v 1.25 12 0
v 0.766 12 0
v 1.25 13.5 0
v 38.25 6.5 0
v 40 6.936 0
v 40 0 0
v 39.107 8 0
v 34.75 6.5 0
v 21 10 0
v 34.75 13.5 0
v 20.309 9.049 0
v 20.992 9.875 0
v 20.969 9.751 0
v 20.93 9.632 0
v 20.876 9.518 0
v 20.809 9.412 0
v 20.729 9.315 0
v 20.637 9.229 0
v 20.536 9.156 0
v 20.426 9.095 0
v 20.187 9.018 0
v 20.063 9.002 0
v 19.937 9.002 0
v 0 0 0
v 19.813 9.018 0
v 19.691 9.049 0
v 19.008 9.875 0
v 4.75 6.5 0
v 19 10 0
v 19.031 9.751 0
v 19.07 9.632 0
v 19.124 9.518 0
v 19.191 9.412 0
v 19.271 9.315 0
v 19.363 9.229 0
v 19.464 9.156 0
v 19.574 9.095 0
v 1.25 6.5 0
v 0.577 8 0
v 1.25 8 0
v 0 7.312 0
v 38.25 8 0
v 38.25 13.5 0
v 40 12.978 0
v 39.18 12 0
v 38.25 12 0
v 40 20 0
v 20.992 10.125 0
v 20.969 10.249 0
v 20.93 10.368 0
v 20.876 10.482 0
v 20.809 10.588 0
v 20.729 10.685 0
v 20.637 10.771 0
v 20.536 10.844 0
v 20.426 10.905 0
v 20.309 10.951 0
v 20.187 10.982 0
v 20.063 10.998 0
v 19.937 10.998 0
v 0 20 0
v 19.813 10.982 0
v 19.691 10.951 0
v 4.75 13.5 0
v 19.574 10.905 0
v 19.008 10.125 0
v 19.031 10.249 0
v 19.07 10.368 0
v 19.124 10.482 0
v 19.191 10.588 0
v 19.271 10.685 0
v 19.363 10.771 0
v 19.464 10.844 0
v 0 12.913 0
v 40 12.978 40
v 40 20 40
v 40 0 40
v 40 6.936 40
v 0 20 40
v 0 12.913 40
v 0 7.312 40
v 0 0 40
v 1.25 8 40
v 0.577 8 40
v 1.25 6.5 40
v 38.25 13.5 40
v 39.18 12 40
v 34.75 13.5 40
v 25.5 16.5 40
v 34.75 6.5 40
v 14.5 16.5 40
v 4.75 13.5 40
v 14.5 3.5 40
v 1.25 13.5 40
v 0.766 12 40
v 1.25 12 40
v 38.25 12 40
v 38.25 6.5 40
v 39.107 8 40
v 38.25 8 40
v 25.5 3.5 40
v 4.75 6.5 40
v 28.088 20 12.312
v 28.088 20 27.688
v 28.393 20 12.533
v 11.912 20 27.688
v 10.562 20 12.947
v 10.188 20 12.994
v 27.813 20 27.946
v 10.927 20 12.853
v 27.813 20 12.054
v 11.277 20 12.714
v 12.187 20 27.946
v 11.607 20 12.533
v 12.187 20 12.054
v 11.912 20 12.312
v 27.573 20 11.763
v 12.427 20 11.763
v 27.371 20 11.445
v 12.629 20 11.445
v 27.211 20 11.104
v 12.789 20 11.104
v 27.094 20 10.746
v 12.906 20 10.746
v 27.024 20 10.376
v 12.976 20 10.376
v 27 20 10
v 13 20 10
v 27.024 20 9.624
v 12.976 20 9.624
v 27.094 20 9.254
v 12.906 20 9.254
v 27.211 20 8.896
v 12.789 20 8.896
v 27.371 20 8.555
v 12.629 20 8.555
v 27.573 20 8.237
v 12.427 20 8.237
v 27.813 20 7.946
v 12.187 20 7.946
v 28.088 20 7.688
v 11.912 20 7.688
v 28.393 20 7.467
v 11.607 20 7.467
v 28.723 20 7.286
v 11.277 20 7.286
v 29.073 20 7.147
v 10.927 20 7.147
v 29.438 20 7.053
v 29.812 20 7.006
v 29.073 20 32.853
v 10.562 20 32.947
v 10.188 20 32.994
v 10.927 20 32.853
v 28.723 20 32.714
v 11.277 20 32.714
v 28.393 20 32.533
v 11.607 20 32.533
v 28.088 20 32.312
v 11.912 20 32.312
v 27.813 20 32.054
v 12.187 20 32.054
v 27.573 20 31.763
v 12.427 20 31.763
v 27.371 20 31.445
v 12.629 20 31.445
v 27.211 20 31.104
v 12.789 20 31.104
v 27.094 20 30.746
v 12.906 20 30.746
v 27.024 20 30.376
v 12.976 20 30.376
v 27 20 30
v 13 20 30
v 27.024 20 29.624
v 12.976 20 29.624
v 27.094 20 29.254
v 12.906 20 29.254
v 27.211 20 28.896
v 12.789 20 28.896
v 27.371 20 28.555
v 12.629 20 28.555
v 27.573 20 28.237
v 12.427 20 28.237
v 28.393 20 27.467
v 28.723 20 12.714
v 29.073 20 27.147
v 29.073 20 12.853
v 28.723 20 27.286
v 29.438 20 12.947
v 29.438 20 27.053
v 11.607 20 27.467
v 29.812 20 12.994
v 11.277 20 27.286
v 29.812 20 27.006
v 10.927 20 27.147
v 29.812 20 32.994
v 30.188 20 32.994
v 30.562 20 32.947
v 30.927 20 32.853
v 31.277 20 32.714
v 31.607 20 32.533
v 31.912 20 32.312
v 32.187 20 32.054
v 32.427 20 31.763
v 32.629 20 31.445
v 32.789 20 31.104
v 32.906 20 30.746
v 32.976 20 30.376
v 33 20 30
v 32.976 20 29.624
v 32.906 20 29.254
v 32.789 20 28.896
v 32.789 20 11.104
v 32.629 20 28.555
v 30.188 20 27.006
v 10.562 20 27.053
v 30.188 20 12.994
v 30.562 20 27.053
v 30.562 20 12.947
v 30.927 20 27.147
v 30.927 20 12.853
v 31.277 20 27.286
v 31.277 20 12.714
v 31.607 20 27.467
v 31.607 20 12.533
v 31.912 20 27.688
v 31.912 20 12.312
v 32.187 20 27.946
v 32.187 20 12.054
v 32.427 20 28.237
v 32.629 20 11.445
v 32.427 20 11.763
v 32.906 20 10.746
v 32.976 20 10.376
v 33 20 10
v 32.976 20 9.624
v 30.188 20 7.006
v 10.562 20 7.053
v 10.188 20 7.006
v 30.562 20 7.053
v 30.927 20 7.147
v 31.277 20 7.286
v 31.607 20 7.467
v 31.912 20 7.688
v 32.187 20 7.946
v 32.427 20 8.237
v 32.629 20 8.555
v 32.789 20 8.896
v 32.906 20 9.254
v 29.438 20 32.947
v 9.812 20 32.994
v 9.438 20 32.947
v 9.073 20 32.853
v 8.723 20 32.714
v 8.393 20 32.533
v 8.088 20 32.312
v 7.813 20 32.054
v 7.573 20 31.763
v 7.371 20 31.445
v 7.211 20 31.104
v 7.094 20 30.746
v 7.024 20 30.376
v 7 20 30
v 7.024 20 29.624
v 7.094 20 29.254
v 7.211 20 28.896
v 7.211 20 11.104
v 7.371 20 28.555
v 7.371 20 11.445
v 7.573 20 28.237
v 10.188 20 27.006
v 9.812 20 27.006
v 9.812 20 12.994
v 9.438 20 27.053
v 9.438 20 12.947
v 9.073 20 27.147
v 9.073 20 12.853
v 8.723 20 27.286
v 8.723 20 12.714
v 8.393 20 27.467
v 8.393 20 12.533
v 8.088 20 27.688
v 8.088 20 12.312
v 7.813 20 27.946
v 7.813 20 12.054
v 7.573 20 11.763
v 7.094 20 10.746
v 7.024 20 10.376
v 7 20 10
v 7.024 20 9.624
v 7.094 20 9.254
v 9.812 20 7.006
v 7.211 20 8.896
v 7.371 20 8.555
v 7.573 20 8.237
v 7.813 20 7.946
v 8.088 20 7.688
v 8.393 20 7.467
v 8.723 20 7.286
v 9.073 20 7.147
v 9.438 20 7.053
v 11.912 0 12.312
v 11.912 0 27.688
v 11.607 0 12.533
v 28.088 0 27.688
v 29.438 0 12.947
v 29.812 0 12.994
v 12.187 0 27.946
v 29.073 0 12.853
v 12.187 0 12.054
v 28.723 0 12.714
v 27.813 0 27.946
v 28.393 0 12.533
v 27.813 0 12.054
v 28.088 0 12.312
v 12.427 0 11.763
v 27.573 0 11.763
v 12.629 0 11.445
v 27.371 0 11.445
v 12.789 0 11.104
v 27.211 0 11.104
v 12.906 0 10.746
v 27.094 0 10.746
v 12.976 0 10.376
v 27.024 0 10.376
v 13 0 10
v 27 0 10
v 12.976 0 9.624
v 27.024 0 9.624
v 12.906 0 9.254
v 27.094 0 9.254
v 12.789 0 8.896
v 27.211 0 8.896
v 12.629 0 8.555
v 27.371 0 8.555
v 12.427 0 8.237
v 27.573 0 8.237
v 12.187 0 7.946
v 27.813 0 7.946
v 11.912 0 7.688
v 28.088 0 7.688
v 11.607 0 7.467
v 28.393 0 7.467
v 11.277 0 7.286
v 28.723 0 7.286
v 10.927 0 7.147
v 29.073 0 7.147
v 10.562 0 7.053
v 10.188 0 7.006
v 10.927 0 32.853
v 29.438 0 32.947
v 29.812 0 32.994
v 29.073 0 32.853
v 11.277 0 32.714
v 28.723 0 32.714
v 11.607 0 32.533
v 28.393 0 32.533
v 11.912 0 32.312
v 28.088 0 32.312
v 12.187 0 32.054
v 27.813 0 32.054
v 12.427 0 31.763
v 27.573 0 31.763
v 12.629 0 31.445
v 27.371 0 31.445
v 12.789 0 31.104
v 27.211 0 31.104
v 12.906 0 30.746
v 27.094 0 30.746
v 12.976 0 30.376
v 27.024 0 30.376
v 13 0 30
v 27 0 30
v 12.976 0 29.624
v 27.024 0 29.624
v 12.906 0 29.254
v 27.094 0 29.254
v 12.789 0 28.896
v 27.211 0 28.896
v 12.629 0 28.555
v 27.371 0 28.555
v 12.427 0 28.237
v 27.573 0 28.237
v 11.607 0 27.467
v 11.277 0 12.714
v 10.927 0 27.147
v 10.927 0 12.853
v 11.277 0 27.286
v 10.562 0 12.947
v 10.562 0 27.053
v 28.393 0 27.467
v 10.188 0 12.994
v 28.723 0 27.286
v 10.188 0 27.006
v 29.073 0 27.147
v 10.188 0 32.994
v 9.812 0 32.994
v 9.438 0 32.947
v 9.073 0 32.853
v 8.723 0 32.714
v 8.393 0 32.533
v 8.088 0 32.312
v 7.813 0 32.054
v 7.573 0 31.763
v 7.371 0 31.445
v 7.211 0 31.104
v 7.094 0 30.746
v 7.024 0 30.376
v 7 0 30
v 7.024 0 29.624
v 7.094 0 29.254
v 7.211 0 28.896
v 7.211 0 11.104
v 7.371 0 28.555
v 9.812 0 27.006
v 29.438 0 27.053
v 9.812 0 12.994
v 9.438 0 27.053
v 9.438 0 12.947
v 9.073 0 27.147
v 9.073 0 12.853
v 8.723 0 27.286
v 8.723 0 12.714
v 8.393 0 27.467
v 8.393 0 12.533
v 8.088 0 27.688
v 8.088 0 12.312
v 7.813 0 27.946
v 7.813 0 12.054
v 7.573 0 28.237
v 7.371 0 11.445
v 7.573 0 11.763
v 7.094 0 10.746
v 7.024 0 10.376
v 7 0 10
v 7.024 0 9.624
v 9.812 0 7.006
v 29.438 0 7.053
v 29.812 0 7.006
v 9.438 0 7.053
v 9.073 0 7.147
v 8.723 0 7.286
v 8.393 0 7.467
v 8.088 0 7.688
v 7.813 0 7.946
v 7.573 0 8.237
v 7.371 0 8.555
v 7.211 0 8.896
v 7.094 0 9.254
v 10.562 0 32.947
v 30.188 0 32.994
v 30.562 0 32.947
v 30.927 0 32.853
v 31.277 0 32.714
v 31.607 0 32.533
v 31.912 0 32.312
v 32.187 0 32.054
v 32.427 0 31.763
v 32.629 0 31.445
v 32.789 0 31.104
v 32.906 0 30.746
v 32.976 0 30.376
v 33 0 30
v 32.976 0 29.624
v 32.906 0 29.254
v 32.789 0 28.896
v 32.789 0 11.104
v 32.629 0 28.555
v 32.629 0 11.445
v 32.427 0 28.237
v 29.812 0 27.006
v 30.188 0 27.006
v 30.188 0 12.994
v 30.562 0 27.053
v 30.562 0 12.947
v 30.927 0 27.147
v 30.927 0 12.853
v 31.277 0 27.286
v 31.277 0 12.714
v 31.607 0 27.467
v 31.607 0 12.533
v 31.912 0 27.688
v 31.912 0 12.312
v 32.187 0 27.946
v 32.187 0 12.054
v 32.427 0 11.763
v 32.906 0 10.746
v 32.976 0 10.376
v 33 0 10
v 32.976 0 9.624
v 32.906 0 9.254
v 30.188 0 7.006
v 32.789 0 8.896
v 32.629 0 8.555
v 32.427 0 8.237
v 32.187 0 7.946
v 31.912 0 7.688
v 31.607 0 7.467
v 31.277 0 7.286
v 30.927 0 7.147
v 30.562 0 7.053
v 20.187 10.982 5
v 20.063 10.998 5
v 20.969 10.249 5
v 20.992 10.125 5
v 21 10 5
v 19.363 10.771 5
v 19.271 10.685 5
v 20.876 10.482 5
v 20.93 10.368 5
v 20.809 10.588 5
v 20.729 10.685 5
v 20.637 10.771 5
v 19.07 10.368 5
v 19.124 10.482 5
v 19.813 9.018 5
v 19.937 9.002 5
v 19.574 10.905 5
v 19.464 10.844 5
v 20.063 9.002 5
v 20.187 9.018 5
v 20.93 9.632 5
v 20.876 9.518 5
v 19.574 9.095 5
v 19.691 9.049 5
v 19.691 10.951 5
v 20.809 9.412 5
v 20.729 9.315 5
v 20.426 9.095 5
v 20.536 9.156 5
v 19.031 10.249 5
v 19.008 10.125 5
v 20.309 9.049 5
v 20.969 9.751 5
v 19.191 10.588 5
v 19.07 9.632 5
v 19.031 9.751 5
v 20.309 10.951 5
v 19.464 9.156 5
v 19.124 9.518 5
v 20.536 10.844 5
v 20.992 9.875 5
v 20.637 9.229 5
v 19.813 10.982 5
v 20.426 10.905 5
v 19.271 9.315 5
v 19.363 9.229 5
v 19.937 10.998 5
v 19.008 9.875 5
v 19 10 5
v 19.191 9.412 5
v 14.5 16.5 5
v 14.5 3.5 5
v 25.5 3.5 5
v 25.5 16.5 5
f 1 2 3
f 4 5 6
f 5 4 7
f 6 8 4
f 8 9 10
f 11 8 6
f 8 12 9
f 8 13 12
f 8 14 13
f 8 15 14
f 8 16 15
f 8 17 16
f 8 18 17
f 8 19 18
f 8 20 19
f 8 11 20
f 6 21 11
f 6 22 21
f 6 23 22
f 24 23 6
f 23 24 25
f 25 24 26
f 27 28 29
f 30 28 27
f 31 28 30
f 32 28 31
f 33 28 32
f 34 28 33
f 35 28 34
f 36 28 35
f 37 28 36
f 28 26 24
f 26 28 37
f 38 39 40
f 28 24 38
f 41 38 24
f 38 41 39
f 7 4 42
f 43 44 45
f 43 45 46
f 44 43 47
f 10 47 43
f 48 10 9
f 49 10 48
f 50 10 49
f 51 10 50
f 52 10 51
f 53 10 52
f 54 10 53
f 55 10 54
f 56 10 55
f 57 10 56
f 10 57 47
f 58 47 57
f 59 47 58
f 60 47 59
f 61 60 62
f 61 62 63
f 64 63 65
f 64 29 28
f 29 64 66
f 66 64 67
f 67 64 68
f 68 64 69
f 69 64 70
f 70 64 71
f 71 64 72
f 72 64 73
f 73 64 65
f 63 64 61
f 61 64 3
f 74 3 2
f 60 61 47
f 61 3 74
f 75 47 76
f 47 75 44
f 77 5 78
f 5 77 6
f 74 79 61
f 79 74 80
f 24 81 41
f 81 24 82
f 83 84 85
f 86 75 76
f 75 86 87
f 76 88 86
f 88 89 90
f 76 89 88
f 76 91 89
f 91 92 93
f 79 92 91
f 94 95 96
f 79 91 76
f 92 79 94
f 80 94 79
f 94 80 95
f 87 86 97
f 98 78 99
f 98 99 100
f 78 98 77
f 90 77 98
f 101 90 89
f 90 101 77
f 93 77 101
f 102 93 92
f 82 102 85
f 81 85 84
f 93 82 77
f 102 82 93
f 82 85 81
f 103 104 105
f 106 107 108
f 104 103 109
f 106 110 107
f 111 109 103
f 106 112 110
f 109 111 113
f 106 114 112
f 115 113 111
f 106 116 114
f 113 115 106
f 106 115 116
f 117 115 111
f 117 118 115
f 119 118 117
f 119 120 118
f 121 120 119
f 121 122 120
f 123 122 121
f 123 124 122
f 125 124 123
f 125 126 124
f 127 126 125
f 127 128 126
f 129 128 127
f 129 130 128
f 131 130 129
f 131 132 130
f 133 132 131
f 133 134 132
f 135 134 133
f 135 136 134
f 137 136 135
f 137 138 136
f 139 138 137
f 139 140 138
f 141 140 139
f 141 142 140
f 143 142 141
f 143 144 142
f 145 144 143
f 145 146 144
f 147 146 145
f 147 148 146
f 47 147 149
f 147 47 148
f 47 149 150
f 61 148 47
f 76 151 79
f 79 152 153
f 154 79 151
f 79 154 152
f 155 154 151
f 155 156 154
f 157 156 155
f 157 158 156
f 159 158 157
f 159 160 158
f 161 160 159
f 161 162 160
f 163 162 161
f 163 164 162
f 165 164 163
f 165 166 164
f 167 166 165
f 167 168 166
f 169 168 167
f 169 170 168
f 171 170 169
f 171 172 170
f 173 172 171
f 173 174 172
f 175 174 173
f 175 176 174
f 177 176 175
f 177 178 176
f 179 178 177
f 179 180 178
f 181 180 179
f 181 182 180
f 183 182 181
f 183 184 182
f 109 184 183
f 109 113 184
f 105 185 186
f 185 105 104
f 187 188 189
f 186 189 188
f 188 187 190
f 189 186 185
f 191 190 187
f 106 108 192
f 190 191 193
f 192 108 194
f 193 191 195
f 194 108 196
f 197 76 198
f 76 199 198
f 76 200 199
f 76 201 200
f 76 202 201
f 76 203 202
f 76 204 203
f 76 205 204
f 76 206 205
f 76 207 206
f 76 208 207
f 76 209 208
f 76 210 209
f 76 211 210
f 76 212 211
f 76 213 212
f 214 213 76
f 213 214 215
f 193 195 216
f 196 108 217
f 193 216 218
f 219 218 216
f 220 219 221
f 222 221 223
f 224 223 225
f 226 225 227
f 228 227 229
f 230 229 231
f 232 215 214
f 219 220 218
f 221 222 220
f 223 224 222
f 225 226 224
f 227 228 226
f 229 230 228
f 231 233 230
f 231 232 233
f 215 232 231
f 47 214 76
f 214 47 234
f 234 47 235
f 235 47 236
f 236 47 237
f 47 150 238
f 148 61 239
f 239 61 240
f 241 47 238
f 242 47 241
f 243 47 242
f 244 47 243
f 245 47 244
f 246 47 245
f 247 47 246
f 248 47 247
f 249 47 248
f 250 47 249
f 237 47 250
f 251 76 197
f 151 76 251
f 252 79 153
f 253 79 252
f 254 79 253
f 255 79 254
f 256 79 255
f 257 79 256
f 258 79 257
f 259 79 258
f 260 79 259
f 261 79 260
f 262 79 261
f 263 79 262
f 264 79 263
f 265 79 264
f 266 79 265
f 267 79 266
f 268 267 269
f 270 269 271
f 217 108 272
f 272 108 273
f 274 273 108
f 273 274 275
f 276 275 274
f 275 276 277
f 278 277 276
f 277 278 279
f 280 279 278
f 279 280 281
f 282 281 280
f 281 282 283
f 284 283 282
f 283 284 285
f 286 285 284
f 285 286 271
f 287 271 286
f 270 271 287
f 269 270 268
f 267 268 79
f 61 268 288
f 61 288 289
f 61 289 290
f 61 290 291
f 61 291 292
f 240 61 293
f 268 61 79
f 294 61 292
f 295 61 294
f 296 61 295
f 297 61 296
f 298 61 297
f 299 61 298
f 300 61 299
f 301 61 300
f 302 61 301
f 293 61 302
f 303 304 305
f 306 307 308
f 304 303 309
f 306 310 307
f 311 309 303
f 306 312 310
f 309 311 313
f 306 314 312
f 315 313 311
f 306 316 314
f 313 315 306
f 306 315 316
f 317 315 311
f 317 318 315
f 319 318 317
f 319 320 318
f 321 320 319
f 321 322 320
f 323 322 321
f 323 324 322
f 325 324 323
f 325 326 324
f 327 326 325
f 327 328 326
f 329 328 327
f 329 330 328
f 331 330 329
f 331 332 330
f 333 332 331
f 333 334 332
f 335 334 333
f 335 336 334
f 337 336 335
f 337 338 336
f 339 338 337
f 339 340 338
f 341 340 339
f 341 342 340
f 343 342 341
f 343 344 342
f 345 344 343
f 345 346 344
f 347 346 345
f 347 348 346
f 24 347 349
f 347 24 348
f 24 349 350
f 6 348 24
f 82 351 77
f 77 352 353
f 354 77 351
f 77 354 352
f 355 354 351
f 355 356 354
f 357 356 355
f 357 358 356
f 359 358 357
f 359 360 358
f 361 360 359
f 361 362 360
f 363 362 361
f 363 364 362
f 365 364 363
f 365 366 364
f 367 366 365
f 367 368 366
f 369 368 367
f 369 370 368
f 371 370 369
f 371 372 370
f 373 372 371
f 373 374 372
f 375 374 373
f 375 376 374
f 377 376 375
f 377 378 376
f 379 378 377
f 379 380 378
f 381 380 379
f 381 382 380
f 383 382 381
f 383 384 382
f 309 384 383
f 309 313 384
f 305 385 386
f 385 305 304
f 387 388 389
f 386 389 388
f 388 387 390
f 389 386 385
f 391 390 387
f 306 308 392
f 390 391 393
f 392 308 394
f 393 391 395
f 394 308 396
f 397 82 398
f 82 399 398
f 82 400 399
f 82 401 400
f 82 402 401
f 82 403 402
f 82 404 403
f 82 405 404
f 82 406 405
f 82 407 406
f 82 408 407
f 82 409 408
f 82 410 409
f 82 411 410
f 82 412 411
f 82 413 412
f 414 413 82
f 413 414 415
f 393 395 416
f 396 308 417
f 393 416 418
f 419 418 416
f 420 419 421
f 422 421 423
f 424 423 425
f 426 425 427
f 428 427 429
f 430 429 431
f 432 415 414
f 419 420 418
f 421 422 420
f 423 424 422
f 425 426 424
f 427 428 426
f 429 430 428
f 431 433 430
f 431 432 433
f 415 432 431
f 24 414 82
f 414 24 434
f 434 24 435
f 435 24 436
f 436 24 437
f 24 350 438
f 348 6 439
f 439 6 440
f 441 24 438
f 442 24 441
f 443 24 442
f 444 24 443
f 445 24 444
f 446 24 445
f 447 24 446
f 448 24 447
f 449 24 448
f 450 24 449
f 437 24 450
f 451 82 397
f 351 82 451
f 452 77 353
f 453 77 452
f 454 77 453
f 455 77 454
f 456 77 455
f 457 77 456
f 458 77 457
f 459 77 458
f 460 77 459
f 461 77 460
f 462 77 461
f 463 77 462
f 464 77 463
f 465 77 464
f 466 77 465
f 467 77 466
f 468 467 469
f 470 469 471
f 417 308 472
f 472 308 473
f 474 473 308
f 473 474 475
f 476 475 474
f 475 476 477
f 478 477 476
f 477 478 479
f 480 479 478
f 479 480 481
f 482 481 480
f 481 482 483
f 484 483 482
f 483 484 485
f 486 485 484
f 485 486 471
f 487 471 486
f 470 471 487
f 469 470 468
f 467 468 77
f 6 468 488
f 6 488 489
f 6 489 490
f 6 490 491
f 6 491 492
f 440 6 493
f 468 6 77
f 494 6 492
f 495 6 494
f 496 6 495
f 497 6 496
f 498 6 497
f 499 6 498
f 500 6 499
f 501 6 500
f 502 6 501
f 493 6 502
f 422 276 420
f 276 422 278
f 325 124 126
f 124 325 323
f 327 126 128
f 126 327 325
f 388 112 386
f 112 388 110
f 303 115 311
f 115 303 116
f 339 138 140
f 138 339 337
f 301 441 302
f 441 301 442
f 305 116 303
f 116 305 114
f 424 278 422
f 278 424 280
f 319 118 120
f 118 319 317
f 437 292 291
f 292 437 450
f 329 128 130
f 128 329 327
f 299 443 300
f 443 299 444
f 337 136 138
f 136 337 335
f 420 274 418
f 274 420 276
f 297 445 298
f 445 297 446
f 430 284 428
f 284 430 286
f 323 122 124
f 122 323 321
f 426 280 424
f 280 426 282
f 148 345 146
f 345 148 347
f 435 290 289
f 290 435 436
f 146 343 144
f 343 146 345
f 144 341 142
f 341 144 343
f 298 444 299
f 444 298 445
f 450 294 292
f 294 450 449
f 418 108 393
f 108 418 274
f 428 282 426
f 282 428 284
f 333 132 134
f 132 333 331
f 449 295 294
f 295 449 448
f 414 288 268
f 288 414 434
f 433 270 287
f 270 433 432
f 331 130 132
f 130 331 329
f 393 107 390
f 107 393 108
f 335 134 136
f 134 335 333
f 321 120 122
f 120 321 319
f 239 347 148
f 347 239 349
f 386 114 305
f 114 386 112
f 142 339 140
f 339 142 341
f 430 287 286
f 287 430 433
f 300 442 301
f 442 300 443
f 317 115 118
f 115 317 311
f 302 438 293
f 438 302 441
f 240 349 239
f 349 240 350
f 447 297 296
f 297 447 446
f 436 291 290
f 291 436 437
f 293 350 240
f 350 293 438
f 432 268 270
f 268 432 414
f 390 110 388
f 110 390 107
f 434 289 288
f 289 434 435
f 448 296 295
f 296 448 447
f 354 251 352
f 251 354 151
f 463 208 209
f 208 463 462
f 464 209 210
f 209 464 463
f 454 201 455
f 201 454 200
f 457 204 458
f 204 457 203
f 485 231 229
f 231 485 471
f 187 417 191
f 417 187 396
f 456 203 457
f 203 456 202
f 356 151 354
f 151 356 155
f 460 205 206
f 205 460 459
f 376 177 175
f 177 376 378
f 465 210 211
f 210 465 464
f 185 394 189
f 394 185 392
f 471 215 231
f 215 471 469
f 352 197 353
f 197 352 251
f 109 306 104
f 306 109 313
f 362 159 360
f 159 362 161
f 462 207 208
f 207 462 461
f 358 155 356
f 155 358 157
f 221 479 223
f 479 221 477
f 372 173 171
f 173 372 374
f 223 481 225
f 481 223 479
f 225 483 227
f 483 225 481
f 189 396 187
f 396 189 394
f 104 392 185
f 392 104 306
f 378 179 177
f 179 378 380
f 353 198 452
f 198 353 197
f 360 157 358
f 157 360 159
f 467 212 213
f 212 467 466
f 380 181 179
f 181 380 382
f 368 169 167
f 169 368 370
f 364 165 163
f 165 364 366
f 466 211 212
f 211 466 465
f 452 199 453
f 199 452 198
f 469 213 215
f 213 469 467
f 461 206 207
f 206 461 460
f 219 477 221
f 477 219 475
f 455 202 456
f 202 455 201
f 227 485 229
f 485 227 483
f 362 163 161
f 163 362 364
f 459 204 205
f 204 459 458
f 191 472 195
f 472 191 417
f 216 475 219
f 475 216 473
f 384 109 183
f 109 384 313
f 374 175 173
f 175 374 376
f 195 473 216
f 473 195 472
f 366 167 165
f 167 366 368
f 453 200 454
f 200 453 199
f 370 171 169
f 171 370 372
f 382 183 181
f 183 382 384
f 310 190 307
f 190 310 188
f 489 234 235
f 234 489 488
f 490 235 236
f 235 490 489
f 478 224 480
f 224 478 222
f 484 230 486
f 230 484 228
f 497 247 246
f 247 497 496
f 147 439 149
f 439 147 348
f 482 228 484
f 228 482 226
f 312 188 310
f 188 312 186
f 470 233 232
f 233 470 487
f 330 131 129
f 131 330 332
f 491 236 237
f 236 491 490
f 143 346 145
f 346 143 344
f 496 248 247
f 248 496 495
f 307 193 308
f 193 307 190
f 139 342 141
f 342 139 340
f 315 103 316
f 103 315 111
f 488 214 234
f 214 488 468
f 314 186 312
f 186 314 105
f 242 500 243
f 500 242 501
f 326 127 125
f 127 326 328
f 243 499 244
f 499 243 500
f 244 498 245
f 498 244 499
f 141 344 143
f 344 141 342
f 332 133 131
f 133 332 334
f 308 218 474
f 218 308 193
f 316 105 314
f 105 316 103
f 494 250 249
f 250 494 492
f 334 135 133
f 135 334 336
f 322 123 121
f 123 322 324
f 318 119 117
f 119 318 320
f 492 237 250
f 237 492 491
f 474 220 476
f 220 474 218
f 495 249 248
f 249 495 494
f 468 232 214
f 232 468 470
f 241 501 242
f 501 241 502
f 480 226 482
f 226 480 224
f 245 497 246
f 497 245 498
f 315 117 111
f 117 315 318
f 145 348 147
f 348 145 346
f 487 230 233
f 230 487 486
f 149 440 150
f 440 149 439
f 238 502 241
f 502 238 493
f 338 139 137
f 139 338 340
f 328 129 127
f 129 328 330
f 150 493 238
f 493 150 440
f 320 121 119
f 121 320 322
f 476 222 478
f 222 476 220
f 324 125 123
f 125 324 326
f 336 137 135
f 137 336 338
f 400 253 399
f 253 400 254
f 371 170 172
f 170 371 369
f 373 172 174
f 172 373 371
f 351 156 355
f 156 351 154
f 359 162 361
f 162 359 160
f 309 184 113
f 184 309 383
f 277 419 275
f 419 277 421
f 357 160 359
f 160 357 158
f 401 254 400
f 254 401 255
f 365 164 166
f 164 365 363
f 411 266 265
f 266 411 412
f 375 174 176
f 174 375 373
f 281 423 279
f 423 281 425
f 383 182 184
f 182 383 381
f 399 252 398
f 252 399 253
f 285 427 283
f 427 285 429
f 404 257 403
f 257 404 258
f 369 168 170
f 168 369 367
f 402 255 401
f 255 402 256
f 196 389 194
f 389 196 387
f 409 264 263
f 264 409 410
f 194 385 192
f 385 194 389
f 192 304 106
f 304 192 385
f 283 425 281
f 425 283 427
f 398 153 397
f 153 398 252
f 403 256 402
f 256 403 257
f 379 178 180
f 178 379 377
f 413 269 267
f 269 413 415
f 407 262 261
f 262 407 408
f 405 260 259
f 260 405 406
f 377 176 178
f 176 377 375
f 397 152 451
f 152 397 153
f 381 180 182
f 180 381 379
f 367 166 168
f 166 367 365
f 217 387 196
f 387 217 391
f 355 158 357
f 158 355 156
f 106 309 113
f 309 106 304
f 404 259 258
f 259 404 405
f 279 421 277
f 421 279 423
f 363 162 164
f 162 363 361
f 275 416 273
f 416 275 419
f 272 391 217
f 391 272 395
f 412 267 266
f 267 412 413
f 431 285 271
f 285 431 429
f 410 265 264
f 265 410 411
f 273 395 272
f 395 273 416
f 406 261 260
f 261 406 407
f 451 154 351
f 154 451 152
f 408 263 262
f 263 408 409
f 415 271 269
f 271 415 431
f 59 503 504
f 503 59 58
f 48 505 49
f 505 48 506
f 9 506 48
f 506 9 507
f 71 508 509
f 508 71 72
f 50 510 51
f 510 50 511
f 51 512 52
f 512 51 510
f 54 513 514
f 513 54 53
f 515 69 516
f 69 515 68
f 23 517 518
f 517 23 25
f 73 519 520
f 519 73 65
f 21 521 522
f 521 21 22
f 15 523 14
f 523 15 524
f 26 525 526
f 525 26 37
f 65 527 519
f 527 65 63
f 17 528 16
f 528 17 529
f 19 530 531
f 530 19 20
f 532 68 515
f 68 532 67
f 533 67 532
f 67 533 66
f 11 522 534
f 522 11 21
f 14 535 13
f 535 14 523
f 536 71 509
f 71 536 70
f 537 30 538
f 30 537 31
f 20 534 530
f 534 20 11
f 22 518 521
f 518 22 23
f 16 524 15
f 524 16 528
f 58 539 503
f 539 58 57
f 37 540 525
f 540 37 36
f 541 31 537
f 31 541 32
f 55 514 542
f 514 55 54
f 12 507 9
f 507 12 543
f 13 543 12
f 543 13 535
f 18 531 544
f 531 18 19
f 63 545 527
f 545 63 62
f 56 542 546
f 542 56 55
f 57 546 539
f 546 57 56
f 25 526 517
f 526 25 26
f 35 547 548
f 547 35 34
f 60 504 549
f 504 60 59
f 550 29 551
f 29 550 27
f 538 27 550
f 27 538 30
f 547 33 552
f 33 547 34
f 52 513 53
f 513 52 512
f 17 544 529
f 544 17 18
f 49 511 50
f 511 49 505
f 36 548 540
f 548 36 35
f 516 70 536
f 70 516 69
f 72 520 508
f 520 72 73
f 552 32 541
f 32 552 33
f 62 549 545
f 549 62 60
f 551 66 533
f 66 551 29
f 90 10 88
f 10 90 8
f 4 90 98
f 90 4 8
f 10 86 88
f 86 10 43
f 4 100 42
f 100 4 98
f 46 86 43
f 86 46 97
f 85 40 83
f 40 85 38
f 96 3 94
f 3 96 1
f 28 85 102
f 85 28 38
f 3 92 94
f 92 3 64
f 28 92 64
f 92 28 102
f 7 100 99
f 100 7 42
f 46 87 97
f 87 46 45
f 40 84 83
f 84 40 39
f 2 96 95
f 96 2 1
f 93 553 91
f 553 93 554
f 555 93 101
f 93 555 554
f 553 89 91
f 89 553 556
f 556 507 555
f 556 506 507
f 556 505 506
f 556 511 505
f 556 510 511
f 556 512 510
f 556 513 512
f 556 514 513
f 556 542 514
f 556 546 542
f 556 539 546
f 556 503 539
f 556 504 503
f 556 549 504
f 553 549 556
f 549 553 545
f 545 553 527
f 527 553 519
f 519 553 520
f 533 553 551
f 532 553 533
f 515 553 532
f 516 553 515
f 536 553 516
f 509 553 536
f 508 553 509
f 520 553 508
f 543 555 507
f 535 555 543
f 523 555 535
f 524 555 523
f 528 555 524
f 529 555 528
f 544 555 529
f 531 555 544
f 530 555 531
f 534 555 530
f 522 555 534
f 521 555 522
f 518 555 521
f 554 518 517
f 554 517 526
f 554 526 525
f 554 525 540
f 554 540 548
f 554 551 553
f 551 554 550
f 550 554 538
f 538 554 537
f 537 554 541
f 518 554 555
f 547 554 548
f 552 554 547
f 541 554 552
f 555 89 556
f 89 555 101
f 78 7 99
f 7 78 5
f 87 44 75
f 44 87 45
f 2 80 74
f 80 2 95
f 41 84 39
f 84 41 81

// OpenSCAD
h = 25;
d = 6;
fn = 50;

cabinaMotor();

module cabinaMotor(){
    
   difference(){
    //pieza central
    rotate([0,90,0])
      translate([-20,10,20])
        cube ([40,20,40], center = true);
       
     // Agujeros principales
    translate([10,10,10])
      rotate([90,0,0])
        cylinder (h = h, d = d, center = true,$fn=fn);
       
    translate([30,10,30])
      rotate([90,0,0])
        cylinder (h = h, d = d, center = true,$fn=fn);

    translate([30,10,10])
      rotate([90,0,0])
        cylinder (h = h, d = d, center = true,$fn=fn);

    translate([10,10,30])
      rotate([90,0,0])
        cylinder (h = h, d = d, center = true,$fn=fn);
        
    // Agujero pequeño centro cubo
    translate([20,10,5])    
      cylinder (h = h, d = 2, center = true,$fn=fn);
 
    // Corte ancho derecha
    rotate([90,0,0])
      translate([36.5,30,-10])
        cube ([3.5,70,7], center = true); 
 
    // Corte ancho izquierda
    rotate([90,0,0])
      translate([3,30,-10])
        cube ([3.5,70,7], center = true); 
      
    // Corte estrecho derecha
    rotate([90,0,0])
      translate([39,30,-10])
        cube ([5,70,4], center = true); 
    
    // Corte estrecho izquierda
    rotate([90,0,0])
      translate([1,30,-10])
        cube ([5,70,4], center = true); 

    // Corte central
    rotate([90,0,0])
      translate([20,40,-10])
        cube ([11,70,13], center = true);  
  
    //corte lateral derecho
    rotate([90,0,40])
        translate([47.6,20,18])
            cylinder(r=25, h=3 ,$fn=3);
            
    rotate([90,0,320])
        translate([34.8,20,-37])
            cylinder(r=25, h=3 ,$fn=3);
            
    //corte lateral izquierdo
    rotate([90,0,220])
        translate([4.2,20,8])
            cylinder(r=25, h=3 ,$fn=3);
            
    rotate([90,0,140])
        translate([17.2,20,5])
            cylinder(r=25, h=3 ,$fn=3);
      
  }
  
  
  
 
  
   
  
    
  
  
  
    
  
}
